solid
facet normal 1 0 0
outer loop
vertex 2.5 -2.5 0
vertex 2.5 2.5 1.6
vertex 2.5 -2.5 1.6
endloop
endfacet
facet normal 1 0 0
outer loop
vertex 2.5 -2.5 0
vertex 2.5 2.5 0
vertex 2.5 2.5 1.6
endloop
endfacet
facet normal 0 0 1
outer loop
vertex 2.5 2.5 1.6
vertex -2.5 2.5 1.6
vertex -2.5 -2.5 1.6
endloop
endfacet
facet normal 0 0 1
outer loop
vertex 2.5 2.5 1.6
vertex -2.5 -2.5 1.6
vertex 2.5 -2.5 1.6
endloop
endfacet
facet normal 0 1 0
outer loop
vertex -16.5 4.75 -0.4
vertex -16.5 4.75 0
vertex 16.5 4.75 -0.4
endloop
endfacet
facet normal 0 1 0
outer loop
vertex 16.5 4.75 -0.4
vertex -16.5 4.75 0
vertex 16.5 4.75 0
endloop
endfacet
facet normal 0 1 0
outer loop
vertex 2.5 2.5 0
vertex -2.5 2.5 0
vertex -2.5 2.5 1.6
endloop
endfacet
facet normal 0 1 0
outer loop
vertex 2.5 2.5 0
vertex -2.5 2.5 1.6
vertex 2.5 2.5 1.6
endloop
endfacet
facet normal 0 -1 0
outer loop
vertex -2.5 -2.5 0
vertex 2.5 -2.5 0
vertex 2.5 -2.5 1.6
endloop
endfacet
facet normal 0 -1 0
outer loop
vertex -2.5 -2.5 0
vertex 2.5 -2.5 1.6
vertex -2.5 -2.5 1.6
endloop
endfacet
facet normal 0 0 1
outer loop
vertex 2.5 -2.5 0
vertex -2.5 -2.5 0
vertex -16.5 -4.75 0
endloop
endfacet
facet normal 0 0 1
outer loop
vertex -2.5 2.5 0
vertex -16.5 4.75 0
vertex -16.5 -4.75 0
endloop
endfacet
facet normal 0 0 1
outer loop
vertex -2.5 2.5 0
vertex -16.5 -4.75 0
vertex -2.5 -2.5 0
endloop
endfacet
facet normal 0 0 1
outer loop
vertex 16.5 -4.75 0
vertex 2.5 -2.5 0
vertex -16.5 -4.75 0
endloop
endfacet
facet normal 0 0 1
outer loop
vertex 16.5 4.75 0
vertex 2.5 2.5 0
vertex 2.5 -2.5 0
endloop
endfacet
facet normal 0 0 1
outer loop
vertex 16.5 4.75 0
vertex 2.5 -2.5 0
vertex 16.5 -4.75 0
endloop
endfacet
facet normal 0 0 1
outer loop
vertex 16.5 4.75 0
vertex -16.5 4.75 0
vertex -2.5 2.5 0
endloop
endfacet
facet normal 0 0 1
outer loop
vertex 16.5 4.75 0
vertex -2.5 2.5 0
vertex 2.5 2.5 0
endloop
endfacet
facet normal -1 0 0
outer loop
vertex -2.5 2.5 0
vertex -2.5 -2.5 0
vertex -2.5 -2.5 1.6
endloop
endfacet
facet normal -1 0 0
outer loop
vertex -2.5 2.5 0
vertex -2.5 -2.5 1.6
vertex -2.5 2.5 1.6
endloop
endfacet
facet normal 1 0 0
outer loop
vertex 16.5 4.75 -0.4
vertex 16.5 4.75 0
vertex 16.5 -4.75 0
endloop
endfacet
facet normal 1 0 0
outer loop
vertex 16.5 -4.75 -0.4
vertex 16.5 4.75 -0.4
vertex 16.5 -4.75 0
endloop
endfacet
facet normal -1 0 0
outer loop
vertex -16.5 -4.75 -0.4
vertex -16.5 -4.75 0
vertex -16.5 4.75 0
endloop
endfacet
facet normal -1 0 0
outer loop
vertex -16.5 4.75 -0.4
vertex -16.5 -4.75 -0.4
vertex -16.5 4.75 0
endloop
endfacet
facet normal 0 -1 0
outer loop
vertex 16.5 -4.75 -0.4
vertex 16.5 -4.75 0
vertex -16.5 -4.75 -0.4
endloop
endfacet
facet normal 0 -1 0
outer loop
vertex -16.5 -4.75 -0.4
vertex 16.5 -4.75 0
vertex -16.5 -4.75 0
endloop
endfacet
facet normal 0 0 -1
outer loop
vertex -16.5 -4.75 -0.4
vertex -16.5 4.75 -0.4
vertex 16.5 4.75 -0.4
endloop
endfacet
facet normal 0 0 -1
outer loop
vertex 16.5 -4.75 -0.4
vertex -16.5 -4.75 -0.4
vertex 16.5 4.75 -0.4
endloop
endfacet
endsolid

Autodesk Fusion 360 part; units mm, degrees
sketch "Sketch1" plane through (0, 0, 0) normal (0, 0, 1) x (1, 0, 0)
  line L0 (16.5, -4.75) -> (-16.5, -4.75)
  line L1 (-16.5, -4.75) -> (-16.5, 4.75)
  line L2 (-16.5, 4.75) -> (16.5, 4.75)
  line L3 (16.5, 4.75) -> (16.5, -4.75)
  line L4 (16.5, -4.75) -> (-16.5, 4.75) construction
  line L5 (-16.5, -4.75) -> (16.5, 4.75) construction
  line L6 (2.5, -2.5) -> (-2.5, -2.5)
  line L7 (-2.5, -2.5) -> (-2.5, 2.5)
  line L8 (-2.5, 2.5) -> (2.5, 2.5)
  line L9 (2.5, 2.5) -> (2.5, -2.5)
  line L10 (2.5, -2.5) -> (-2.5, 2.5) construction
  line L11 (-2.5, -2.5) -> (2.5, 2.5) construction
  dimension "d1" = 14
  dimension "d2" = 14
  dimension "d3" = 5
  dimension "d4" = 5
  dimension "d5" = 9.5
  dimension "d6" = 33
extrude "Extrude1" add sketch "Sketch1" against normal blind 0.4 contours L0 L1 L2 L3 | L6 L7 L8 L9
extrude "Extrude2" add sketch "Sketch1" along normal blind 1.6 contours L6 L7 L8 L9
